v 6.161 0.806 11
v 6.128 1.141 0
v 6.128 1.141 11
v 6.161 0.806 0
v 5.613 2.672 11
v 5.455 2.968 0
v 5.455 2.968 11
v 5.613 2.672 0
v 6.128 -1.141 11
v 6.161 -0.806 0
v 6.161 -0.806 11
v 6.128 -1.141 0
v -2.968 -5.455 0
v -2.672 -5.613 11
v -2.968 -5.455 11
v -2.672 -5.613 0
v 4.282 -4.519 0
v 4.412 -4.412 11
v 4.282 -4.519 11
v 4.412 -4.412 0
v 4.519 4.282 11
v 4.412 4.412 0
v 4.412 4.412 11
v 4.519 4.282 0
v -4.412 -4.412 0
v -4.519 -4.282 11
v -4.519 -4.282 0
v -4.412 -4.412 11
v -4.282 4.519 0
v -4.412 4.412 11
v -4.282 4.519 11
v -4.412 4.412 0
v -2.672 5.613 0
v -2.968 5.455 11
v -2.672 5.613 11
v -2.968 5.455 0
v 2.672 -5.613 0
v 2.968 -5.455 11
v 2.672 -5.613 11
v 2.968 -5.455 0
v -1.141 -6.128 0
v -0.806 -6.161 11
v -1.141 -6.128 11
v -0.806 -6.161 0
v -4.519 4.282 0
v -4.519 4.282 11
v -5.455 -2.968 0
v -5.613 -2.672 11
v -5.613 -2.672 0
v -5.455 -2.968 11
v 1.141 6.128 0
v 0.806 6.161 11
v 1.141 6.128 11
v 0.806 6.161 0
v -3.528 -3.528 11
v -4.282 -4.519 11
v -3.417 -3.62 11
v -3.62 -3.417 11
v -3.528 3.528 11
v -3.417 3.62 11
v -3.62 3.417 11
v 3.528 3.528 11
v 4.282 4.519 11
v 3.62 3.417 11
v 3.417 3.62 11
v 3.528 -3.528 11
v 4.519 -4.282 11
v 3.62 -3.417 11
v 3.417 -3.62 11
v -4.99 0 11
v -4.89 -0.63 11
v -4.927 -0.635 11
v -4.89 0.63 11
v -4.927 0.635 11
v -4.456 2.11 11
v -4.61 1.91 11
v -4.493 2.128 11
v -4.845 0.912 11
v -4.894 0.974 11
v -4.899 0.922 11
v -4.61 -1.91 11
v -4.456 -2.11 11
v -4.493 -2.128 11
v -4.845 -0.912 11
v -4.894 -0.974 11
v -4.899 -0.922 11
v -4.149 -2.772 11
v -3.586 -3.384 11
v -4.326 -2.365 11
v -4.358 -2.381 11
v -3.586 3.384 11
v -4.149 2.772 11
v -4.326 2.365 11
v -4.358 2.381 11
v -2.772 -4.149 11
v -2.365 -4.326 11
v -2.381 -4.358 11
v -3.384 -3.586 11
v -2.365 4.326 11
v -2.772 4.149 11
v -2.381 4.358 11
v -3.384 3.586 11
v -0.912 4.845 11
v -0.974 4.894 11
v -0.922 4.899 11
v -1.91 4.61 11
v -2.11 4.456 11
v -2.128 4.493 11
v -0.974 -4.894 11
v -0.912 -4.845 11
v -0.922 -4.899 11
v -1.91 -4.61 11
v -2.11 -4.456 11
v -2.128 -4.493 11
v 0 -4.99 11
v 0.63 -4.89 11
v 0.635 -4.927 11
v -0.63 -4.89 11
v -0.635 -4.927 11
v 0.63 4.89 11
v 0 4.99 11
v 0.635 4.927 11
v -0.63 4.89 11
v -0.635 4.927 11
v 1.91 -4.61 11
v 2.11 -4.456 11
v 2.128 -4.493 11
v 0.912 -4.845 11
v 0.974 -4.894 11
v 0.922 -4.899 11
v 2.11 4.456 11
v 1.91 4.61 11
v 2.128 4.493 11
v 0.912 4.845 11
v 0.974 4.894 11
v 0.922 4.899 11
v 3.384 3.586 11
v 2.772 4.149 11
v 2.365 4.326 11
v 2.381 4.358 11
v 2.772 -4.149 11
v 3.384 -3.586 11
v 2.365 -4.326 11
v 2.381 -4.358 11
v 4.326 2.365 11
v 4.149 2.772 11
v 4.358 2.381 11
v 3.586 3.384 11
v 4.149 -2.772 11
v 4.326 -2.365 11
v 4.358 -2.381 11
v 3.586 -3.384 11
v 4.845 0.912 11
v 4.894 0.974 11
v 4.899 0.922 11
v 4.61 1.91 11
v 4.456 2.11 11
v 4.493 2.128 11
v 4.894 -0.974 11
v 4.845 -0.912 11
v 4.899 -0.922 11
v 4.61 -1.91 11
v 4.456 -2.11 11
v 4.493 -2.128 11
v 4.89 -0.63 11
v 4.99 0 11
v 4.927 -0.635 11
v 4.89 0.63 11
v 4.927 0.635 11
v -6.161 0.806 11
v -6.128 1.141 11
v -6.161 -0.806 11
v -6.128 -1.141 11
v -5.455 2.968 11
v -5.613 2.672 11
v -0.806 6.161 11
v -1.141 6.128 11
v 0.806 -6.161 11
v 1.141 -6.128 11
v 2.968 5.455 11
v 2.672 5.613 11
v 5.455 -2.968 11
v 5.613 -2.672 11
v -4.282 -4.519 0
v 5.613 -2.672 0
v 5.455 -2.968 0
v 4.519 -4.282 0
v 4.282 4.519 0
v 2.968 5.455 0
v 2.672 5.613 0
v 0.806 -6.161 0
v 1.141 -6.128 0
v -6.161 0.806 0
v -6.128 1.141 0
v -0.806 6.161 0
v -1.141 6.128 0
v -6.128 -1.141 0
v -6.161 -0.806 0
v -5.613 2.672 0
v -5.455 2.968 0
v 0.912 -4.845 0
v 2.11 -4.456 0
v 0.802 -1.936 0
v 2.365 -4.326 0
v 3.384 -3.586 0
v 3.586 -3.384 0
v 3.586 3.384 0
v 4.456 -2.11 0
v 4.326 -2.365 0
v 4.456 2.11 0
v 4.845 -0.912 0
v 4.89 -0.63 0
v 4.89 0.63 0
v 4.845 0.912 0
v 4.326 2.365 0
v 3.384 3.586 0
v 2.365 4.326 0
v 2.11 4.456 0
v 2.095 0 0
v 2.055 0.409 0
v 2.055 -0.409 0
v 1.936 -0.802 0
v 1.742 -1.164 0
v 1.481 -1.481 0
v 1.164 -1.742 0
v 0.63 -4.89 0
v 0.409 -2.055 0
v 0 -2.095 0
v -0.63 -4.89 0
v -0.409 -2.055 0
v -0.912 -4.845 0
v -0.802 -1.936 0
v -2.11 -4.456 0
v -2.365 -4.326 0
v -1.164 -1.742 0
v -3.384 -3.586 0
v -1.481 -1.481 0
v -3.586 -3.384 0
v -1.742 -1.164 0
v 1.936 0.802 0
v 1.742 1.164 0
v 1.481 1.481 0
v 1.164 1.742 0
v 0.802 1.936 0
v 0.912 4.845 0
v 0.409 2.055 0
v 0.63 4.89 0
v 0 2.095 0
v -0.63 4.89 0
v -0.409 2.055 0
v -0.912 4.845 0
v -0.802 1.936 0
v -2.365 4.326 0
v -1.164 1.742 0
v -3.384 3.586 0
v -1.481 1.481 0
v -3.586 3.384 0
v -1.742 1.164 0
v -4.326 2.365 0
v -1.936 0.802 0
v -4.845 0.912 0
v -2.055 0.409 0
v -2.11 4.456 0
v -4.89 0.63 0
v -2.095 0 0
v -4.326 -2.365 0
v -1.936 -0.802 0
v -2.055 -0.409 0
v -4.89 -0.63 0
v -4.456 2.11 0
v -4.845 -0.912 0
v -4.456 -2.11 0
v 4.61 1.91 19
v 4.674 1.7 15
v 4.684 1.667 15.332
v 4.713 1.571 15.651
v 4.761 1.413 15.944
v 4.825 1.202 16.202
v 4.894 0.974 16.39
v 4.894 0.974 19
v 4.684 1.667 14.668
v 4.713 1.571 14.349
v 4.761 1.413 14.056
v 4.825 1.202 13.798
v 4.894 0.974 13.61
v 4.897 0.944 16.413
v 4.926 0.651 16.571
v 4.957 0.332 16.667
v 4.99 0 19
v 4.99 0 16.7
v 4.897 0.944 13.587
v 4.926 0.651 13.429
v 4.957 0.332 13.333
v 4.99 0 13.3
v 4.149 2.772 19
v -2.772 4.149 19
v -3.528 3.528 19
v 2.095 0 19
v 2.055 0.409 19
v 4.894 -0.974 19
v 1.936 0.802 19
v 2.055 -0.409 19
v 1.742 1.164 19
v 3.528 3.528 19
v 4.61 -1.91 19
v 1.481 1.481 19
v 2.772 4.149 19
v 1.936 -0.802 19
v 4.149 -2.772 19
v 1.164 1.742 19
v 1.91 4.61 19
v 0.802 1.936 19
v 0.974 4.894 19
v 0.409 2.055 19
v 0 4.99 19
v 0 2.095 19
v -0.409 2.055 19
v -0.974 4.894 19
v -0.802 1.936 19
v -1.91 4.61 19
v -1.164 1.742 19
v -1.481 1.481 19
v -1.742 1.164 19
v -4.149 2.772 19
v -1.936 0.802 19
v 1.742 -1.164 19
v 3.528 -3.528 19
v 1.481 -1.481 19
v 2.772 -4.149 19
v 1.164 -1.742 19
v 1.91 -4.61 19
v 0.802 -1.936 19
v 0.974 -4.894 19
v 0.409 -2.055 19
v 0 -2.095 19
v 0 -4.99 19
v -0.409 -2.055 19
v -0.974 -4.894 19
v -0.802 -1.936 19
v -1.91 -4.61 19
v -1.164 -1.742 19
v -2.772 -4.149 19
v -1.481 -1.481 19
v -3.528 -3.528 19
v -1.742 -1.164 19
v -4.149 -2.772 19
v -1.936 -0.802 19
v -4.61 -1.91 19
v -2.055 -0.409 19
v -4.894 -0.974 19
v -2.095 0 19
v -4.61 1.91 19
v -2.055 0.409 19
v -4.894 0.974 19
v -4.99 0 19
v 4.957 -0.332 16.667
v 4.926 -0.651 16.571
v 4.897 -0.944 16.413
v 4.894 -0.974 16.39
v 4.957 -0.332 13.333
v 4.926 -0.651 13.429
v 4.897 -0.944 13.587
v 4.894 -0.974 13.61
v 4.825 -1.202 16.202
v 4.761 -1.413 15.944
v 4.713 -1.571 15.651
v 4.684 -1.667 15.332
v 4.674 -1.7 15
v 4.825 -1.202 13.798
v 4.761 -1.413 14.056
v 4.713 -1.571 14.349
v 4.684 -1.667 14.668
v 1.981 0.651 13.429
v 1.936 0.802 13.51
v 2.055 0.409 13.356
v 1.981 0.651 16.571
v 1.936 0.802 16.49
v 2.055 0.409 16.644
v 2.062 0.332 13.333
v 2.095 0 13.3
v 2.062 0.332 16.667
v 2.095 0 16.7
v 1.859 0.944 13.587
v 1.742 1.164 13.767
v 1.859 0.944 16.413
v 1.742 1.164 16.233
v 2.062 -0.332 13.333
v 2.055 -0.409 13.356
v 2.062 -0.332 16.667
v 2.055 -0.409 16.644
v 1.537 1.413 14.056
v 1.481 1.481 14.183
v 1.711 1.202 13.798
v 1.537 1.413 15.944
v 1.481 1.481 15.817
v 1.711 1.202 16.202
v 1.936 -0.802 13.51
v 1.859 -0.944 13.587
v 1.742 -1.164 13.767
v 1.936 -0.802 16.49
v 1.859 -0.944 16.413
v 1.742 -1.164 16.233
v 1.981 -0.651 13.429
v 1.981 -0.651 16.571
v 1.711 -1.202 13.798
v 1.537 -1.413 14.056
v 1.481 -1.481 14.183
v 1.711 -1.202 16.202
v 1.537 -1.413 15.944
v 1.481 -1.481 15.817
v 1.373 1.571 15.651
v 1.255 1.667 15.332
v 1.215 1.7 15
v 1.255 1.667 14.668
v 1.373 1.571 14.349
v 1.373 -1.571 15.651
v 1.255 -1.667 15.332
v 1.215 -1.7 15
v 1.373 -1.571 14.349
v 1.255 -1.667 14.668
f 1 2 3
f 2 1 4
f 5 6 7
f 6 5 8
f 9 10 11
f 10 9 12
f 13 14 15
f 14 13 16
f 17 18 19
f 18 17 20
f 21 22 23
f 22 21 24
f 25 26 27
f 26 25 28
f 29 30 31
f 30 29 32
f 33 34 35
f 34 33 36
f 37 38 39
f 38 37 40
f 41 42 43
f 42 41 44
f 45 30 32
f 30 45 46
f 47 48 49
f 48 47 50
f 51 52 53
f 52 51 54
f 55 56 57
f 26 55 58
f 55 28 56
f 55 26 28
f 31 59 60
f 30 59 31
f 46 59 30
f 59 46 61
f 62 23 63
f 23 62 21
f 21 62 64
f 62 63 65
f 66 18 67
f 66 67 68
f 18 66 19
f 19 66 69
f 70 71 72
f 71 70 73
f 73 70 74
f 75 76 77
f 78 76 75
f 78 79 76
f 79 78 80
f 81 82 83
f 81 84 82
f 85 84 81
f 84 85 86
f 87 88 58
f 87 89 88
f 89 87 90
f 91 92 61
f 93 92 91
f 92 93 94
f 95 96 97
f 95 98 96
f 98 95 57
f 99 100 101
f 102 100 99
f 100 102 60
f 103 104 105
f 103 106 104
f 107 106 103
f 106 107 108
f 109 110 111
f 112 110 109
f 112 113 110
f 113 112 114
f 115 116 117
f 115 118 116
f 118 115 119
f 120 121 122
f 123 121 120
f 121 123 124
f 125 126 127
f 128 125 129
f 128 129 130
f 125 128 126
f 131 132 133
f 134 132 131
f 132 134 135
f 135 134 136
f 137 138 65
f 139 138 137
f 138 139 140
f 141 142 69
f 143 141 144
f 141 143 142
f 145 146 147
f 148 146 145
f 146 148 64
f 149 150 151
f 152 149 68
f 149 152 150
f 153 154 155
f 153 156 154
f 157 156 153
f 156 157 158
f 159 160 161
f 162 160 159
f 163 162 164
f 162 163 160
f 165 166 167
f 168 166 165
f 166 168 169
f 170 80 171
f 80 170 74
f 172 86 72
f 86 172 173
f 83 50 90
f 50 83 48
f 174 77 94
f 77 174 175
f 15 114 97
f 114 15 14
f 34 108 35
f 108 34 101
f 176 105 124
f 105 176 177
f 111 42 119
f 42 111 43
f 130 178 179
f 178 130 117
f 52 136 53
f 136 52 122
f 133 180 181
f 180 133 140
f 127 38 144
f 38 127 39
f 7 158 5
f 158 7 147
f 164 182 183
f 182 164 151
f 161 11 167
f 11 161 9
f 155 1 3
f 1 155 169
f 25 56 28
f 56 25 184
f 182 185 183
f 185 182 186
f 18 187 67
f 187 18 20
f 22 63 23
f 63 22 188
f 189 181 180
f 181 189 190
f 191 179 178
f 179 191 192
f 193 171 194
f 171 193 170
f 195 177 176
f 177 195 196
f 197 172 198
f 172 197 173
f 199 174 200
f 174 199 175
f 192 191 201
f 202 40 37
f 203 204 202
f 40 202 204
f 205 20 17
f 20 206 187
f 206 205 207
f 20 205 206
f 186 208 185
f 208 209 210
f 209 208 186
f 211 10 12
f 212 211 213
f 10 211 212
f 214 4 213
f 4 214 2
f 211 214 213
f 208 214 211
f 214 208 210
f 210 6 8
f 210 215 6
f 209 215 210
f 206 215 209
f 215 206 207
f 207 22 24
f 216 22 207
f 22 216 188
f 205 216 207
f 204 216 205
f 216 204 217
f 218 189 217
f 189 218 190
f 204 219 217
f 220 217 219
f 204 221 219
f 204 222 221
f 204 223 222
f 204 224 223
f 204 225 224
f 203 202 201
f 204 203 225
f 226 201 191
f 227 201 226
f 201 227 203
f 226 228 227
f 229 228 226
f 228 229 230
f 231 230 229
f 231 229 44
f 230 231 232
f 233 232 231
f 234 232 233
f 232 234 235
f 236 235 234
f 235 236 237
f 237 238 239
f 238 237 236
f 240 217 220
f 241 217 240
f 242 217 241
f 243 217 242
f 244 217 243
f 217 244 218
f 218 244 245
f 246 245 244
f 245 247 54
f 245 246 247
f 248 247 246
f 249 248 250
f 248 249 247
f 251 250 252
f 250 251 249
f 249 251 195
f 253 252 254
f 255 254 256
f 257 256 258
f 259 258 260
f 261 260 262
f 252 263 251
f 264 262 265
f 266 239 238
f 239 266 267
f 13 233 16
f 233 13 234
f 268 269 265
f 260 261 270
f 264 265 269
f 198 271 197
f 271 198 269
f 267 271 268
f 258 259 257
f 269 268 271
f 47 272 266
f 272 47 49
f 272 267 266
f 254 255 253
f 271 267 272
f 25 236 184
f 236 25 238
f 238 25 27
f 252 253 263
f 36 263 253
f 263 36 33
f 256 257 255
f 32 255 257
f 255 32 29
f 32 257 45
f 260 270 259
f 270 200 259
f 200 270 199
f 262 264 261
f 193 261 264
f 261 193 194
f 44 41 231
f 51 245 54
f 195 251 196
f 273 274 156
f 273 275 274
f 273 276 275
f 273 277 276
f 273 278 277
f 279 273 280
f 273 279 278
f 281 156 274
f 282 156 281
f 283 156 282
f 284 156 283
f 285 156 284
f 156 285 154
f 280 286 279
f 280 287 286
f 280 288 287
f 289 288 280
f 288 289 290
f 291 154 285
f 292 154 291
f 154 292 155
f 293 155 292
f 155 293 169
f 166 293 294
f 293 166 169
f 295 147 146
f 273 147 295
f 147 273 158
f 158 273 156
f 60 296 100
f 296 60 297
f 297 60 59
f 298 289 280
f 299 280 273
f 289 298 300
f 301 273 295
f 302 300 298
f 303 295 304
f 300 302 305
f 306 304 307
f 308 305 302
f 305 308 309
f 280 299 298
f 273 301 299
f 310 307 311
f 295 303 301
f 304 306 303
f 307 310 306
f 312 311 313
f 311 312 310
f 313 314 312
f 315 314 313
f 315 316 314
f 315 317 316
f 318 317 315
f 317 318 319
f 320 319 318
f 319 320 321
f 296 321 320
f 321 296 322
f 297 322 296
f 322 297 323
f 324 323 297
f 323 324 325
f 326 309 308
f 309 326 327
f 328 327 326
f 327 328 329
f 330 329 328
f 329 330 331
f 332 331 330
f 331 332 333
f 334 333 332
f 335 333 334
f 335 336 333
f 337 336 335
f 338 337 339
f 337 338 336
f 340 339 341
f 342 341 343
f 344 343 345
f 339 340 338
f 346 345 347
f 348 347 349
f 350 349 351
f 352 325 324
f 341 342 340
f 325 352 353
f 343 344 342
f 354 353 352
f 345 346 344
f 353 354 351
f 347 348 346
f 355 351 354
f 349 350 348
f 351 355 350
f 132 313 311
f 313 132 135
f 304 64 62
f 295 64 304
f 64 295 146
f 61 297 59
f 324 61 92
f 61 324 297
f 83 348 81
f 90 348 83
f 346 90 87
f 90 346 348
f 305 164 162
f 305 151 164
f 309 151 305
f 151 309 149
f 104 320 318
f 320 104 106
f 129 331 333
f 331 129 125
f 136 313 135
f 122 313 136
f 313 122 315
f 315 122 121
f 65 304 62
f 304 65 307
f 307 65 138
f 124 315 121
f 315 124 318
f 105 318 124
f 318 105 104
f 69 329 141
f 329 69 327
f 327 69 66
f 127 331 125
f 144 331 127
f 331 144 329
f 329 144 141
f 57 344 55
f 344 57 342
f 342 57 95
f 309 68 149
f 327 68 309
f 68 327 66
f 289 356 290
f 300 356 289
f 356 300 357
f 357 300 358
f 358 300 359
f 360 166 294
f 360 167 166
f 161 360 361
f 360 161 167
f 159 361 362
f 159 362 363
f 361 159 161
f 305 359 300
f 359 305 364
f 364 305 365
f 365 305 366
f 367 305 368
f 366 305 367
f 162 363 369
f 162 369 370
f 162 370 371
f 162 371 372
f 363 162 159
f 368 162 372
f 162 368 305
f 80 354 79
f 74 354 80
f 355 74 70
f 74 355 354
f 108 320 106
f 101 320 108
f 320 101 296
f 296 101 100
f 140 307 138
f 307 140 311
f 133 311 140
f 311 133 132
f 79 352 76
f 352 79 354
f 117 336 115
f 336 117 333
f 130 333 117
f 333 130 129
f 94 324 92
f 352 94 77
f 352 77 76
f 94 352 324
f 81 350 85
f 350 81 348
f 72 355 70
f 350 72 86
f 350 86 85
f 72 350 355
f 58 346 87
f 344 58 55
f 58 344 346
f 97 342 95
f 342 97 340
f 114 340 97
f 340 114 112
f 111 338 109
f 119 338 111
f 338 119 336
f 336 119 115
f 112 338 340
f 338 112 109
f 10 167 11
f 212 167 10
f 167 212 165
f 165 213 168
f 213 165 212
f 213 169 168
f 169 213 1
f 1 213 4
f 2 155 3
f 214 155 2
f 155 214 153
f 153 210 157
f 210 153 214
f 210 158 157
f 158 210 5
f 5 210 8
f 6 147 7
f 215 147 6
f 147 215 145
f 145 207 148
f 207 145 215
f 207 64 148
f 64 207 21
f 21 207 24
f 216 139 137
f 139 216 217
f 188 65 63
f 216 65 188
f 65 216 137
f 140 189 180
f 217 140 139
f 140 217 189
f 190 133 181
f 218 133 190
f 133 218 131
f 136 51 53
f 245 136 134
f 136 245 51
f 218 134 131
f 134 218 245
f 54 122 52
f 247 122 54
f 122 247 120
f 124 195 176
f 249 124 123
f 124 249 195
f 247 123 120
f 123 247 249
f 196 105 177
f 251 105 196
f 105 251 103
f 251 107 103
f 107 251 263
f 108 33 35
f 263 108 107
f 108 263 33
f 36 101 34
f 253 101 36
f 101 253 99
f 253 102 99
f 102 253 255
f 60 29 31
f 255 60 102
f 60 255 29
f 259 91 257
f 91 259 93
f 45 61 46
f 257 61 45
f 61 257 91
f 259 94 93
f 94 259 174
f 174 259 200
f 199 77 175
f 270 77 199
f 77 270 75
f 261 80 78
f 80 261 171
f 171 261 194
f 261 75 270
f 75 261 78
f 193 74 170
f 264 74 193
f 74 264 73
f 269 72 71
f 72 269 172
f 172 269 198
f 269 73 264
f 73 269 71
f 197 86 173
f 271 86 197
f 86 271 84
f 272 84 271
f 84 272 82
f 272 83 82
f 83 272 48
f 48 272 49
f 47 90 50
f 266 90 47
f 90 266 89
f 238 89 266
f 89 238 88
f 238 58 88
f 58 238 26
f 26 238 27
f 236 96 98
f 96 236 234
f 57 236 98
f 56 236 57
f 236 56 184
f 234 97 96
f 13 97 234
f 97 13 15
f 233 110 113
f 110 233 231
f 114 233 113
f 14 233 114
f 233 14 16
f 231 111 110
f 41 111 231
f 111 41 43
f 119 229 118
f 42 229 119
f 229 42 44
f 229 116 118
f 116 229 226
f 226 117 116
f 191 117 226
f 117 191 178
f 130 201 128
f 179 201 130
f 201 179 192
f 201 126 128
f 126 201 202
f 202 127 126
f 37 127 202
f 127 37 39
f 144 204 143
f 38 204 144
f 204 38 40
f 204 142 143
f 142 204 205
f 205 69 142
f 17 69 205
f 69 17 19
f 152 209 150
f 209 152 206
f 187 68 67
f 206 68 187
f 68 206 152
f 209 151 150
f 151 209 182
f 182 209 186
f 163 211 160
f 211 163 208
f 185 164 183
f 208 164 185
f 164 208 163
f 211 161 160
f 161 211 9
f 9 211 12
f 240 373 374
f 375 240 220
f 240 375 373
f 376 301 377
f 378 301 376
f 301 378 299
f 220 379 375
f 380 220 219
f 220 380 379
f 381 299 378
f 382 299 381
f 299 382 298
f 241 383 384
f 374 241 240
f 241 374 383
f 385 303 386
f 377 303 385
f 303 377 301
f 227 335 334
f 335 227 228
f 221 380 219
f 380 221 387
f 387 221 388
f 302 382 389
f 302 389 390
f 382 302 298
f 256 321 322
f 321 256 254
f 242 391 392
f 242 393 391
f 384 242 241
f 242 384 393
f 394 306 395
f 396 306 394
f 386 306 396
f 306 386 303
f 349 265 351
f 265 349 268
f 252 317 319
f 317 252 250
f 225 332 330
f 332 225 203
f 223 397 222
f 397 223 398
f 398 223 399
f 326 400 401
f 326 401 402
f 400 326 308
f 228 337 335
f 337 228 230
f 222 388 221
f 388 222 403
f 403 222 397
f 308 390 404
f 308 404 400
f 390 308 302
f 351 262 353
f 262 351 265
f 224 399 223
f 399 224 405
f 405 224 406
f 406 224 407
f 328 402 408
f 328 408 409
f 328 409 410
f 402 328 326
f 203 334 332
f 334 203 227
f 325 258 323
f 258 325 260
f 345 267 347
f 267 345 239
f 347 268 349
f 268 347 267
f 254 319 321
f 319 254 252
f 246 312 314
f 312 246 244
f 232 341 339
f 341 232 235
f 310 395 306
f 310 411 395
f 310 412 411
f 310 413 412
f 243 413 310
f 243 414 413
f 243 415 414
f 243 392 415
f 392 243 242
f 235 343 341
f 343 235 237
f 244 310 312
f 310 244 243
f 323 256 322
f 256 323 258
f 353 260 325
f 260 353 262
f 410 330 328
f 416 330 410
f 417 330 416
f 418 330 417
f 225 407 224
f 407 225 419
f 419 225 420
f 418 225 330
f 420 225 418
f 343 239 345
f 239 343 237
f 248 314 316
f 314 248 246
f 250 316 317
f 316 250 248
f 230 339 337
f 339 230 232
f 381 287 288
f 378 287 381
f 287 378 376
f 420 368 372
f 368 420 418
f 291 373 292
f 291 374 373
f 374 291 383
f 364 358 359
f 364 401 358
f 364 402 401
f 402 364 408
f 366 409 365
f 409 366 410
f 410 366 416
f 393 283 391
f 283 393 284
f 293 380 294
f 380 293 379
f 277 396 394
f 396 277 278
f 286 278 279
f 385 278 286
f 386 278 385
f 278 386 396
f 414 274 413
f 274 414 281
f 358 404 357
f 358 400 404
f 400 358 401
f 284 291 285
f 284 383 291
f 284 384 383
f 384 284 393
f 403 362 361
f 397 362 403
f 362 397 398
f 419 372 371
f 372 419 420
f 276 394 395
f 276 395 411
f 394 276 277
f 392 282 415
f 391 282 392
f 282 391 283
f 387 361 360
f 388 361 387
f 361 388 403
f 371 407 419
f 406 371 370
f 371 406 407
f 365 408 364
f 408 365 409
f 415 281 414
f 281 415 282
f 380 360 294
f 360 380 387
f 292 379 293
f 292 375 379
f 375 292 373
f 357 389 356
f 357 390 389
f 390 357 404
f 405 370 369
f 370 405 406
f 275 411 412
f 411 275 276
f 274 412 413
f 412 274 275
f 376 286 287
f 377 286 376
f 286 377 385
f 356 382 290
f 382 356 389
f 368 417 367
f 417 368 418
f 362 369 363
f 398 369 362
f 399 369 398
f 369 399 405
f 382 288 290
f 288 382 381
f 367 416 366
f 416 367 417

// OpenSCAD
$fn = 32;

// ----------------------------------------------------------------------
// Timing pulley: GT2 20T, pitch 2 mm, 12.48 mm x 19 mm
// ----------------------------------------------------------------------

// --- parameters (mm) ---
pitch_mm = 2;             // belt pitch
tooth_count = 20;         // number of grooves
width = 11;               // belt width between the flanges
tip_d = 12.48;            // tip circle diameter
root_d = 10.98;           // groove bottom diameter
groove_h = 0.75;          // groove depth
tooth_w = 1.5;            // groove width at the tip circle
hub_bore = 4.19;          // shaft bore
hub_d = 9.98;             // hub diameter
hub_h = 8;                // hub above the flange
bottom_z = 0;             // lowest point of the pulley
top_z = 19;               // highest point of the pulley
set_d = 3.4;              // set screw tap hole

module rim() {
  cylinder(h = width, d = tip_d);
}

module groove_cutter() {
  /* belt tooth groove: deeper than wide, cut through the belt width */
  translate([root_d / 2, 0, 0])
    linear_extrude(height = width)
      polygon(points = [[-0.6, -tooth_w * 0.42], [groove_h + 0.6, -tooth_w * 0.6],
                        [groove_h + 0.6, tooth_w * 0.6], [-0.6, tooth_w * 0.42]]);
}

module hub() {
  translate([0, 0, bottom_z]) cylinder(h = top_z - bottom_z, d = hub_d);
}

difference() {
  union() {
    rim();
    hub();
  }
  for (i = [0 : tooth_count - 1]) rotate([0, 0, i * 360 / tooth_count]) groove_cutter();
  translate([0, 0, bottom_z - 1]) cylinder(h = top_z - bottom_z + 2, d = hub_bore);
  translate([-1, 0, top_z - hub_h * 0.5]) rotate([0, 90, 0]) cylinder(h = hub_d / 2 + 3, d = set_d);
}
